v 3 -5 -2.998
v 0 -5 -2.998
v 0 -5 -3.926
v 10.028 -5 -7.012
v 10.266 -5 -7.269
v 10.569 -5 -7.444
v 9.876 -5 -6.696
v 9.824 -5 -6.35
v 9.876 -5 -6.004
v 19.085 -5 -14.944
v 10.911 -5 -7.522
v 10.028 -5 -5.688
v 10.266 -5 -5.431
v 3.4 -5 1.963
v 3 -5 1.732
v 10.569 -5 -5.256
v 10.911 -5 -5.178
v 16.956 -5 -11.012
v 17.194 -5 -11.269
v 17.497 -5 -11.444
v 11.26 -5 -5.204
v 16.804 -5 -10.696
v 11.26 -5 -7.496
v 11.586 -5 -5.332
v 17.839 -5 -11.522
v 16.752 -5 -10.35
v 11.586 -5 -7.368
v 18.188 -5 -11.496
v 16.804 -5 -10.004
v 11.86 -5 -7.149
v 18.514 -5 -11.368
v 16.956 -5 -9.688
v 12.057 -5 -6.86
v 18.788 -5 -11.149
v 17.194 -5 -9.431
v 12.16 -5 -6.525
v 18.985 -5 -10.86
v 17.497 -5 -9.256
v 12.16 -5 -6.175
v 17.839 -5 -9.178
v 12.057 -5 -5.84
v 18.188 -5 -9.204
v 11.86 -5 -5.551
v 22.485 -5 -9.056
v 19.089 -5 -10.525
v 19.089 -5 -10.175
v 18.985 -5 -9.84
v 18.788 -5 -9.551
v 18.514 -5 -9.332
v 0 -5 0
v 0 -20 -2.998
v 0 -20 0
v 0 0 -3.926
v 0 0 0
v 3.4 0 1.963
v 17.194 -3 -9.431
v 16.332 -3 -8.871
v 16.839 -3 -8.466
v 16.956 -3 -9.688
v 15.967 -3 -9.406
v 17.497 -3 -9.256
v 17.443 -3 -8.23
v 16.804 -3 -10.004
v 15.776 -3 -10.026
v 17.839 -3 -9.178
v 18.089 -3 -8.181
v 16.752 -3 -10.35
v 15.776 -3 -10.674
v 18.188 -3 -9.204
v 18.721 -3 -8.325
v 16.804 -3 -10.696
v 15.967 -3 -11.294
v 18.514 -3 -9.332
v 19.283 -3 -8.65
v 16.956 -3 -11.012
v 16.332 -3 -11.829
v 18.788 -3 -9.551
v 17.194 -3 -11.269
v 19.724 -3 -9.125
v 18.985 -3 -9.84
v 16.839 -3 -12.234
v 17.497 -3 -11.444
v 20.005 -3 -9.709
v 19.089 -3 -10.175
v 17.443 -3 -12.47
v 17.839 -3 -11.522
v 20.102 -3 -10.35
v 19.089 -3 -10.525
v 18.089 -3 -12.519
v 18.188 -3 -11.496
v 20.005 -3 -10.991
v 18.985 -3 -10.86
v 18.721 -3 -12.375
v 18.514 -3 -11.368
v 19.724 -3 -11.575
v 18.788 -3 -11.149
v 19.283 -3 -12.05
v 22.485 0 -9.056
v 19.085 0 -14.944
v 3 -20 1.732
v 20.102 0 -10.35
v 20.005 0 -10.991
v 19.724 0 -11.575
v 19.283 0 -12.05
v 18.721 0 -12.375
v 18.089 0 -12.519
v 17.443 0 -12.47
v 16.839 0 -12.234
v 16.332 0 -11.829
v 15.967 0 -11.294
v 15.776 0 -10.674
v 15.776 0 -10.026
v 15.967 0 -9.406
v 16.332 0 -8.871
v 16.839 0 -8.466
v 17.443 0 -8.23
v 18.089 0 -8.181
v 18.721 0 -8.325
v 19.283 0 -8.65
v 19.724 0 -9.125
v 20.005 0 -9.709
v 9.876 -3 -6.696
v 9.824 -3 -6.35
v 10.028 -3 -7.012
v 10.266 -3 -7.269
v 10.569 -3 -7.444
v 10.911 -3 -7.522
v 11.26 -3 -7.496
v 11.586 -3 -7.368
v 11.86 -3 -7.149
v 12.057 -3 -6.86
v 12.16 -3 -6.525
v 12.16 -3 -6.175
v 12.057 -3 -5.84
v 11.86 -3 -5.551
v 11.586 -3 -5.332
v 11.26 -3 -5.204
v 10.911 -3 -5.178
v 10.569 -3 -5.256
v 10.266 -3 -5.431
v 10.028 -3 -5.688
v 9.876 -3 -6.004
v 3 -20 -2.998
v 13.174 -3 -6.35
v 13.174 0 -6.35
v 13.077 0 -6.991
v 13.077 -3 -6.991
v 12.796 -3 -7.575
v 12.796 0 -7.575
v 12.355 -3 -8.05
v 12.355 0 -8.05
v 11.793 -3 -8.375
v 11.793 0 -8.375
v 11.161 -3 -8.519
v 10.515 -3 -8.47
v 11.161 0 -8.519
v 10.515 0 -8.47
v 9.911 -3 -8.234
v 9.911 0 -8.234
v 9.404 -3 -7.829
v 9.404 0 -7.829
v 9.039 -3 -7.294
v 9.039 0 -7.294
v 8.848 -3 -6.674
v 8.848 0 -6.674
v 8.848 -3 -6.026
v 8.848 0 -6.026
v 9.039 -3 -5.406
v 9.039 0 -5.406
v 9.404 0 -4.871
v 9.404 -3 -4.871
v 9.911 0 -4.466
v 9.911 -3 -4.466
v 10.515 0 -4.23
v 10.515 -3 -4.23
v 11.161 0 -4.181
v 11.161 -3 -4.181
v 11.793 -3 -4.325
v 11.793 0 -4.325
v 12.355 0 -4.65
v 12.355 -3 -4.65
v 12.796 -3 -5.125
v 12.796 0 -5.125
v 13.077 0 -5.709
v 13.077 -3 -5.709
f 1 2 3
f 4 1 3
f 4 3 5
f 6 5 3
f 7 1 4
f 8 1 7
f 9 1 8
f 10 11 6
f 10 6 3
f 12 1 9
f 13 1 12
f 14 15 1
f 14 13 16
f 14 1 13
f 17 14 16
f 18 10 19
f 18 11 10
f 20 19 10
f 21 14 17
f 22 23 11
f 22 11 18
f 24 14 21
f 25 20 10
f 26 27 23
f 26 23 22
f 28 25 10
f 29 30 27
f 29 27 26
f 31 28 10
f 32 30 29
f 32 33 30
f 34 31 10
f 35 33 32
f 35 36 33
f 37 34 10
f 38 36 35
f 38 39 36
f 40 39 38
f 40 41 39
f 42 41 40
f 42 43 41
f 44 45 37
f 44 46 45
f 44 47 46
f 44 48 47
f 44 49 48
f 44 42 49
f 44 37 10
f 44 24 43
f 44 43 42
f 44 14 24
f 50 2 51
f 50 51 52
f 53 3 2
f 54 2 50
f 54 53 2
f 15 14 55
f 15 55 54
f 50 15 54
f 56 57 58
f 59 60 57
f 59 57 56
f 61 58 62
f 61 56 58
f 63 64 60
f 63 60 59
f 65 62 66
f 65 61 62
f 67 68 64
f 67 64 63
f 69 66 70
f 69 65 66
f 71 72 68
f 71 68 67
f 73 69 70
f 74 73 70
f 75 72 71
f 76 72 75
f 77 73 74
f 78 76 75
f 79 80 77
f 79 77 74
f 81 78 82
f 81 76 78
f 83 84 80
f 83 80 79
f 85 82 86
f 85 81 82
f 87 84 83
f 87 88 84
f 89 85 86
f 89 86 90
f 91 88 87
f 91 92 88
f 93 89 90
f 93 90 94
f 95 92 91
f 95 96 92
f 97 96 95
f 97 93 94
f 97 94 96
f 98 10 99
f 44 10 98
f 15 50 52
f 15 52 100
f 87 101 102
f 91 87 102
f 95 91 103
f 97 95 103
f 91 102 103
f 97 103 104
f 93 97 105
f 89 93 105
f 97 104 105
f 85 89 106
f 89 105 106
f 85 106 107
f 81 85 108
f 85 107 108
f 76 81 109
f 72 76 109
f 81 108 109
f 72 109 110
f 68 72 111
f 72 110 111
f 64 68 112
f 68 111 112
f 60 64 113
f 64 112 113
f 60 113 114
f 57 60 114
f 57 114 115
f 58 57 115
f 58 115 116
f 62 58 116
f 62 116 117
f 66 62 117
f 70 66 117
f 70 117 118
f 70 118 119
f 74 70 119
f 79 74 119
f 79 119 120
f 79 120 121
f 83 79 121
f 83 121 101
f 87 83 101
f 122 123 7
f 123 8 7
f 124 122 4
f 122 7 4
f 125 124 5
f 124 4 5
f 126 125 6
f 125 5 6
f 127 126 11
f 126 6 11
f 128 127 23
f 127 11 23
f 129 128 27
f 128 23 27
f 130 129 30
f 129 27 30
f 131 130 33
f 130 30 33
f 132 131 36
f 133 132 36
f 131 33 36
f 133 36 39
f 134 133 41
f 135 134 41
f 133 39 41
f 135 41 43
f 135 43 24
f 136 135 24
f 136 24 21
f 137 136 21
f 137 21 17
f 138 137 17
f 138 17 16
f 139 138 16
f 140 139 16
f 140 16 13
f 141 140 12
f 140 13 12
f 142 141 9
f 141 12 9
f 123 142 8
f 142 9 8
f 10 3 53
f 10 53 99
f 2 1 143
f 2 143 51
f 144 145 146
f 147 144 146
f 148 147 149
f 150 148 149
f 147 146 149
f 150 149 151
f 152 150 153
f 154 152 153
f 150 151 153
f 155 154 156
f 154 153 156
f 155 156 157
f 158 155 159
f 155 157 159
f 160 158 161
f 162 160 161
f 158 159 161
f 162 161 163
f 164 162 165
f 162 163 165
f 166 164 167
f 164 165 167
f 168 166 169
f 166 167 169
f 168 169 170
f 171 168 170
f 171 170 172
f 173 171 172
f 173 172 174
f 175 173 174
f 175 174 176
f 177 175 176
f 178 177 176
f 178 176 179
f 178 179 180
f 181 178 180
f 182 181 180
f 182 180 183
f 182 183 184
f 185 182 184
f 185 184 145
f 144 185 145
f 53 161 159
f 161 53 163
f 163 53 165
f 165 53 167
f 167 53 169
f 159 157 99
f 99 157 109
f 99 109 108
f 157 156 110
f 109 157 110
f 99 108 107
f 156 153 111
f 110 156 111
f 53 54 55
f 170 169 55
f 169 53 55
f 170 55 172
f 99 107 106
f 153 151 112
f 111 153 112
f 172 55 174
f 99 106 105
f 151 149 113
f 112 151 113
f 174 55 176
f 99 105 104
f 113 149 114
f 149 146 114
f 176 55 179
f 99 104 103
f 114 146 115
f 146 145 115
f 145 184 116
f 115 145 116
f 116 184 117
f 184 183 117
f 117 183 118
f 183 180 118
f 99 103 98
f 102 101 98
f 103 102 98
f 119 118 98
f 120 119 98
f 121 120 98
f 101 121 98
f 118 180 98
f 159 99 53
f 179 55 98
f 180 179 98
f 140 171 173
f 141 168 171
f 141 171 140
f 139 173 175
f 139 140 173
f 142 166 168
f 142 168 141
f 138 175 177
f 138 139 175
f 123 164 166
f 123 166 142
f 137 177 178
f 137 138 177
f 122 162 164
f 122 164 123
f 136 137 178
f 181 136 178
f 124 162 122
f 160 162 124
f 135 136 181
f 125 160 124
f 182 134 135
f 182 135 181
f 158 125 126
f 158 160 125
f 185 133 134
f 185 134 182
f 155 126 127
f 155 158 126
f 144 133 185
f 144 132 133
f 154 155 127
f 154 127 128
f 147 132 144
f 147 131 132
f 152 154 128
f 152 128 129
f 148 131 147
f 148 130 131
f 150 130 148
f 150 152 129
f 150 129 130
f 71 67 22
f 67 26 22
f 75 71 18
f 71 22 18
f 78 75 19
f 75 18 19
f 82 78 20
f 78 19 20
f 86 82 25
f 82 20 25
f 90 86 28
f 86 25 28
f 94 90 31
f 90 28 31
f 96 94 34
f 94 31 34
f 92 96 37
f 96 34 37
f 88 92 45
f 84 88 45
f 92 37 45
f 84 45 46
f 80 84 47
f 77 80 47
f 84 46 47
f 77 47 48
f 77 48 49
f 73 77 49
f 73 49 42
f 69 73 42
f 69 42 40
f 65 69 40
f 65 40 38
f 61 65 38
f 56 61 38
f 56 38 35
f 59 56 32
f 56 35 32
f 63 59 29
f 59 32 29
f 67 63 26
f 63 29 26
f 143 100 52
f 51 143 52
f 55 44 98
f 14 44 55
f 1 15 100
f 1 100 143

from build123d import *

# Parameters (mm, degrees)
EXTRUDE_1_DEPTH              = 5
EXTRUDE_2_DEPTH              = 15
HOLE_WIZARD_M2_1_D           = 2.35
HOLE_WIZARD_M2_1_DEPTH       = 20
HOLE_WIZARD_M2_1_CBORE_D     = 4.35
HOLE_WIZARD_M2_1_CBORE_DEPTH = 3


with BuildPart() as part:
    # 草圖1 → 填料-伸長1 (new body)
    with BuildSketch(Plane.XZ.offset(5)):
        Polygon((3.4, 1.962990915), (0, 0), (0, -3.92598183), (19.084609691, -14.944486373), (22.484609691, -9.055513627), align=None)
    extrude(amount=-EXTRUDE_1_DEPTH)

    # 草圖2 → 填料-伸長2 (add)
    with BuildSketch(Plane.XZ.offset(5)):
        Polygon((3, 1.732050808), (3, -2.997949192), (0, -2.997949192), (0, 0), align=None)
    extrude(amount=EXTRUDE_2_DEPTH)

    # M2 六角頭機械螺釘的柱孔1
    with Locations(Plane(origin=(0, 0, 0), x_dir=(1, 0, 0), z_dir=(0, 1, 0))):
        with Locations((17.926725858, 10.35), (10.998522628, 6.35)):
            CounterBoreHole(HOLE_WIZARD_M2_1_D / 2, HOLE_WIZARD_M2_1_CBORE_D / 2, HOLE_WIZARD_M2_1_CBORE_DEPTH, depth=HOLE_WIZARD_M2_1_DEPTH)


solid = part.part
